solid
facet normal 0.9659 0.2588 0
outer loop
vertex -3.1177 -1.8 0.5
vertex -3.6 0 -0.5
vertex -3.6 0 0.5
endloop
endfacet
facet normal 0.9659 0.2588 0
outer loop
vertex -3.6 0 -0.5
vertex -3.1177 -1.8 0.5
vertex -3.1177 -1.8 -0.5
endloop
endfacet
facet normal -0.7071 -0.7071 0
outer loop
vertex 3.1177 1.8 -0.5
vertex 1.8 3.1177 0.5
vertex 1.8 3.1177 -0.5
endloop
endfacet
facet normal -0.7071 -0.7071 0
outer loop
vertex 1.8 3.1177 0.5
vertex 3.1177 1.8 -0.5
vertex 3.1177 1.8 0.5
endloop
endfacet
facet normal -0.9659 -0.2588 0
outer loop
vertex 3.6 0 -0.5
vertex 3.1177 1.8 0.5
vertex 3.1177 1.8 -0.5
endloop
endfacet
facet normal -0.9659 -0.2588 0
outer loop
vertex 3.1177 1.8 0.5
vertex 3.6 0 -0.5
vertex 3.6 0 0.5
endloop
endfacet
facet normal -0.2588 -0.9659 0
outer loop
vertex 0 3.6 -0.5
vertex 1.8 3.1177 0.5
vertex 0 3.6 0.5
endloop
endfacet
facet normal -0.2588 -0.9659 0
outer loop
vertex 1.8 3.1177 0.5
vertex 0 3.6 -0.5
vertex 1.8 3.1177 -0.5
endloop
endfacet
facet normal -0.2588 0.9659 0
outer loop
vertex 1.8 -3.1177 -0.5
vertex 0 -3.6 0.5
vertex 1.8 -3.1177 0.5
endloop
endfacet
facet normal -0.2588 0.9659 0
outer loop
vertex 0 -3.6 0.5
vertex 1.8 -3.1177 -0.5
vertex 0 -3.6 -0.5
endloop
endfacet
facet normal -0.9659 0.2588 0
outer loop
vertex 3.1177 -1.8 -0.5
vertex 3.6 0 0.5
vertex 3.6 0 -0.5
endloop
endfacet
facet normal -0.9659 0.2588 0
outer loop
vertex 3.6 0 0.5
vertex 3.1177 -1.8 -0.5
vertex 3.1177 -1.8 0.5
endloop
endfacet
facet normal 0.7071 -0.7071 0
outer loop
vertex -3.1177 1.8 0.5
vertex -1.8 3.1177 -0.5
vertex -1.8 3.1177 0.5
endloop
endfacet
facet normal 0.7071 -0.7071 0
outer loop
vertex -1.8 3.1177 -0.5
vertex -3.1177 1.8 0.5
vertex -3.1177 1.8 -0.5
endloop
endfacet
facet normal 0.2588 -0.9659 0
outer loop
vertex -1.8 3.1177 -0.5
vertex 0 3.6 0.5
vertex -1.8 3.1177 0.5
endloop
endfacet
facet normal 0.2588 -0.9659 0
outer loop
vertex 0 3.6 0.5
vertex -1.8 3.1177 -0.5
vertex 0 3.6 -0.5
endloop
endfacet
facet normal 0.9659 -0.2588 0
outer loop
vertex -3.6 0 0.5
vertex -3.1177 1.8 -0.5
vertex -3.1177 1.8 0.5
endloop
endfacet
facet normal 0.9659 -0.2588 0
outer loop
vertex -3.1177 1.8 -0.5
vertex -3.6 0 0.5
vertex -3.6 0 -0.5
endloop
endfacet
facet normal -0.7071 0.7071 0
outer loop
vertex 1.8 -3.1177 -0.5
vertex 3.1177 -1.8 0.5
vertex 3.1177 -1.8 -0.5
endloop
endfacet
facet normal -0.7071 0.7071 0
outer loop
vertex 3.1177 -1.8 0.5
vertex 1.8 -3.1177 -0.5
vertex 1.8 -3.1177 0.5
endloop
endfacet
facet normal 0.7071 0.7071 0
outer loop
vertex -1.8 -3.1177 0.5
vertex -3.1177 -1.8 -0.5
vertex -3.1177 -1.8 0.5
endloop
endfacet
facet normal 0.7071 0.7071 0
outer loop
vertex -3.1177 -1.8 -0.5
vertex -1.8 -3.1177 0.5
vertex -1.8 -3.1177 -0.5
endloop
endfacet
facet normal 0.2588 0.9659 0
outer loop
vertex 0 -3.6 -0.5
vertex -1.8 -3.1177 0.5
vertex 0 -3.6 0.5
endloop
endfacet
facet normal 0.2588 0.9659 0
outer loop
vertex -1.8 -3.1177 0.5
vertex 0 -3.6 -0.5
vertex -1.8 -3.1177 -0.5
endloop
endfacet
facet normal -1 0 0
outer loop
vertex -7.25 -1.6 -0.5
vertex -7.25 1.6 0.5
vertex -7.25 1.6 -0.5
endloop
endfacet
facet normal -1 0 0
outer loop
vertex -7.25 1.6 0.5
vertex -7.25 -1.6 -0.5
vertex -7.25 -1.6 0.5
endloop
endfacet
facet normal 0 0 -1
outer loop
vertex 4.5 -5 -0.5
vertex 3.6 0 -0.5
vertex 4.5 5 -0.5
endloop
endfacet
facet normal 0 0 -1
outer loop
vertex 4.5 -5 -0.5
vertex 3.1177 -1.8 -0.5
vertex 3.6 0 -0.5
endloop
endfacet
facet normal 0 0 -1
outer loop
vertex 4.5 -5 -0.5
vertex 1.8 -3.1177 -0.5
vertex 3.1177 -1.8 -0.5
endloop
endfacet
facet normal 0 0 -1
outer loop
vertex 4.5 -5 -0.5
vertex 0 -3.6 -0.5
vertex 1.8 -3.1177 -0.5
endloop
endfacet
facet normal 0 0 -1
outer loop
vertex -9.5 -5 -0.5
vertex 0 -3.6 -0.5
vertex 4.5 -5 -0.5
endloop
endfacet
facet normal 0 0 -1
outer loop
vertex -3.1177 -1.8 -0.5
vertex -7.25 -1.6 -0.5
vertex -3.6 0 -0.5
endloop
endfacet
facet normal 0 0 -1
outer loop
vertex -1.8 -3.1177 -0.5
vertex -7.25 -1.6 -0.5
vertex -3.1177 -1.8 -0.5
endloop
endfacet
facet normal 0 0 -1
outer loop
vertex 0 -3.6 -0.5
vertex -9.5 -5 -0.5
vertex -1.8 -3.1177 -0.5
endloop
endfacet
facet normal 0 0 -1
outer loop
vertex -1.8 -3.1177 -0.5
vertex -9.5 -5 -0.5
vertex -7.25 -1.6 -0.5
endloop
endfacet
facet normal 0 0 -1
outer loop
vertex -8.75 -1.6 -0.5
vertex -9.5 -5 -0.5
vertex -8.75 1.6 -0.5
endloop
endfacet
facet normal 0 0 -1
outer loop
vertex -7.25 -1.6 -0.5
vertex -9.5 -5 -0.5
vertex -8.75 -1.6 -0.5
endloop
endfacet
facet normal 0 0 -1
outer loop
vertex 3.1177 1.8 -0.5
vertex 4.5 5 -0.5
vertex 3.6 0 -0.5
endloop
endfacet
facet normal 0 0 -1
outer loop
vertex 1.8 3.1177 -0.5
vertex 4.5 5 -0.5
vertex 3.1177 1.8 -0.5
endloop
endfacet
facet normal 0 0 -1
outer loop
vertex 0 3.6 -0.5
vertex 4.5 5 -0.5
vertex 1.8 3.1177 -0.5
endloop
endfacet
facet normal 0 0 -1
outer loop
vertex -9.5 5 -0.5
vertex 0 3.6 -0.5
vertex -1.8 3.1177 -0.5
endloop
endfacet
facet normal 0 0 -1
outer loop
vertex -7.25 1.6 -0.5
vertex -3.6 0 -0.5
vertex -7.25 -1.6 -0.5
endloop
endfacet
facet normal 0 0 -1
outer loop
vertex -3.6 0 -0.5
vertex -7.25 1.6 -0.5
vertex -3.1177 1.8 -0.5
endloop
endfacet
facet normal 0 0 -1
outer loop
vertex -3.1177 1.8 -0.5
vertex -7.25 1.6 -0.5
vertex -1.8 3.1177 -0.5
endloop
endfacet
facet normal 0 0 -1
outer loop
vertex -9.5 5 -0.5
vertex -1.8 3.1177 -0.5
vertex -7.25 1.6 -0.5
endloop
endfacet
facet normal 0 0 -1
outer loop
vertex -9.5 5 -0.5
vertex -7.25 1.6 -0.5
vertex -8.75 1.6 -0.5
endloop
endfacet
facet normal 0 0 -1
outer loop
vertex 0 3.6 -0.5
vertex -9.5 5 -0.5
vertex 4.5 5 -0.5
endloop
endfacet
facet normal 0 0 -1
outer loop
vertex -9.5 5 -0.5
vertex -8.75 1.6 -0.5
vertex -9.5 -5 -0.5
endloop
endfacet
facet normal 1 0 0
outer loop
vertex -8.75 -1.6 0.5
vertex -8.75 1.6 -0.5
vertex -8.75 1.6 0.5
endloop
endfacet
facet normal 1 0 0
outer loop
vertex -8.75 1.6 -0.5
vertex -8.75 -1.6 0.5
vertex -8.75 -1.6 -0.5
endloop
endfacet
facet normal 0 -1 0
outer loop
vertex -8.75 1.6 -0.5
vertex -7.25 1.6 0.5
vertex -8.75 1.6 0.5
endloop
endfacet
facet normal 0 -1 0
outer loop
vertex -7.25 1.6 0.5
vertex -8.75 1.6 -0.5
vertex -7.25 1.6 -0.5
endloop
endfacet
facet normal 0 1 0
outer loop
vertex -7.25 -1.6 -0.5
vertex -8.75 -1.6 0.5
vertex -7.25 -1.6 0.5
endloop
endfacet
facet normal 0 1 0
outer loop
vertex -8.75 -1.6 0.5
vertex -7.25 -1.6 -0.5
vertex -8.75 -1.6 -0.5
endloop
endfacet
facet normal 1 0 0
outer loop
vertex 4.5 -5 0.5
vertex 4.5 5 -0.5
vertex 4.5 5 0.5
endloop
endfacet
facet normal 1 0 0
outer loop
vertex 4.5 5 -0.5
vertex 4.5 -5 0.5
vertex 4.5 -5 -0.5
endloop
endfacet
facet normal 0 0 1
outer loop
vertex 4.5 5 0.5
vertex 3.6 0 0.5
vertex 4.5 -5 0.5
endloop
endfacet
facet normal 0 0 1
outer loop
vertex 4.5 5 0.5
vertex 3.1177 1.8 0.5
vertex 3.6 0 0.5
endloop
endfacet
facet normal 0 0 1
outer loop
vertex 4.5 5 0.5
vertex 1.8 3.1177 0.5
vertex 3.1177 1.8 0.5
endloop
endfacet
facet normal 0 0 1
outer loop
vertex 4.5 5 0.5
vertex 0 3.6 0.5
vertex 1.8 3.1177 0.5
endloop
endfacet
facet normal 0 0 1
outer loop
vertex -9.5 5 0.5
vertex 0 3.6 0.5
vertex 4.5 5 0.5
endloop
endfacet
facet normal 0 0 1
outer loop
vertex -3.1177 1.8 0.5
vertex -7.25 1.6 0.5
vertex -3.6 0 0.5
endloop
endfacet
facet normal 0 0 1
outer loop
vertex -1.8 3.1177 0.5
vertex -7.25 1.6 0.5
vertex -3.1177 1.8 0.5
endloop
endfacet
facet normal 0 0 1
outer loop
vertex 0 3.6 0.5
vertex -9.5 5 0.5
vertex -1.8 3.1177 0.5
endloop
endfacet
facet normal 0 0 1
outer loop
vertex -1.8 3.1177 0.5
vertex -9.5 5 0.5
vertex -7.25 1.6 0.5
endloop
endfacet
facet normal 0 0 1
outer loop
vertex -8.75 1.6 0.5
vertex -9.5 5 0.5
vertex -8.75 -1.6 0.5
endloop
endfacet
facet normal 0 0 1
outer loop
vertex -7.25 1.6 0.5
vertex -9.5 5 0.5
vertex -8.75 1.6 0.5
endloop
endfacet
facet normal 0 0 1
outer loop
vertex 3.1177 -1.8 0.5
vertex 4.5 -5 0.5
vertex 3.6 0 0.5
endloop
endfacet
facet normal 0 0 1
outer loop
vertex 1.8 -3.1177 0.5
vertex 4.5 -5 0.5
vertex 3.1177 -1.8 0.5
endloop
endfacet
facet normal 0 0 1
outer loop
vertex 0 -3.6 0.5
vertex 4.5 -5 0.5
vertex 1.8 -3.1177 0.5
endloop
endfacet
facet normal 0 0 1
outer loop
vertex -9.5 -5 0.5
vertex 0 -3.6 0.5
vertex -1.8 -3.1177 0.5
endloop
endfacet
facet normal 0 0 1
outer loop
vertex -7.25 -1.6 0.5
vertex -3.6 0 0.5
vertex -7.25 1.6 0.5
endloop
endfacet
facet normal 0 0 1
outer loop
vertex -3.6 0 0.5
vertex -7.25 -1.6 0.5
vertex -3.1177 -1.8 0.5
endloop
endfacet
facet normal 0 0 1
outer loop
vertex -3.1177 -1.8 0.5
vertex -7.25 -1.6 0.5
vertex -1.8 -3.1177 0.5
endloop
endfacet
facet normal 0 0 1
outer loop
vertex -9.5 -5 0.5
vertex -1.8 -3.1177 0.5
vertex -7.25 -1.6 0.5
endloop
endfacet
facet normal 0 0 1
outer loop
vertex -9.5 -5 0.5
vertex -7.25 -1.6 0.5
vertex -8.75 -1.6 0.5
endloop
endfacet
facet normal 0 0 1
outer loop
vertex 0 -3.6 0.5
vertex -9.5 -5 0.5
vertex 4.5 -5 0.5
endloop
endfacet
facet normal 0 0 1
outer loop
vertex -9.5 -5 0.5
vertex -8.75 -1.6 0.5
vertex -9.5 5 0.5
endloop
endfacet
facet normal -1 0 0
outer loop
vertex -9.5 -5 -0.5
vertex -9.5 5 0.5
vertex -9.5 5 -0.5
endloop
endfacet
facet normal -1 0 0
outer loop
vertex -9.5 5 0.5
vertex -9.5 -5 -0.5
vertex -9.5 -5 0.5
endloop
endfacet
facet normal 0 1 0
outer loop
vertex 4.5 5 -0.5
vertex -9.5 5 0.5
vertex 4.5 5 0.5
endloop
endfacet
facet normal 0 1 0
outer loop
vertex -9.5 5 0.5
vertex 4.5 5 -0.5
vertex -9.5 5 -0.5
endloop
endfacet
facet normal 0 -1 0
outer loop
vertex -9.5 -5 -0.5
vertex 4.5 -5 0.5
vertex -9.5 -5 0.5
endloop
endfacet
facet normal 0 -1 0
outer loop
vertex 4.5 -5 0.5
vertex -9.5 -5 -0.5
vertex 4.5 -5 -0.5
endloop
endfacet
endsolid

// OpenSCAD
/*

cd /Users/d/Desktop/3dprint/ImplicitCad/
~/.cabal/bin/extopenscad pot3.scad

*/

$res=0.15;


module pot() {
	cylinder(r=3.6, h=5, center = true);
	translate([-8, 0, 0.75])
	cube(size = [1.5, 3.2, 2.5], center = true);
}

difference(){
    translate([-2.5,0,0])
	cube(size = [14, 10, 1], center = true);
	pot();
}
